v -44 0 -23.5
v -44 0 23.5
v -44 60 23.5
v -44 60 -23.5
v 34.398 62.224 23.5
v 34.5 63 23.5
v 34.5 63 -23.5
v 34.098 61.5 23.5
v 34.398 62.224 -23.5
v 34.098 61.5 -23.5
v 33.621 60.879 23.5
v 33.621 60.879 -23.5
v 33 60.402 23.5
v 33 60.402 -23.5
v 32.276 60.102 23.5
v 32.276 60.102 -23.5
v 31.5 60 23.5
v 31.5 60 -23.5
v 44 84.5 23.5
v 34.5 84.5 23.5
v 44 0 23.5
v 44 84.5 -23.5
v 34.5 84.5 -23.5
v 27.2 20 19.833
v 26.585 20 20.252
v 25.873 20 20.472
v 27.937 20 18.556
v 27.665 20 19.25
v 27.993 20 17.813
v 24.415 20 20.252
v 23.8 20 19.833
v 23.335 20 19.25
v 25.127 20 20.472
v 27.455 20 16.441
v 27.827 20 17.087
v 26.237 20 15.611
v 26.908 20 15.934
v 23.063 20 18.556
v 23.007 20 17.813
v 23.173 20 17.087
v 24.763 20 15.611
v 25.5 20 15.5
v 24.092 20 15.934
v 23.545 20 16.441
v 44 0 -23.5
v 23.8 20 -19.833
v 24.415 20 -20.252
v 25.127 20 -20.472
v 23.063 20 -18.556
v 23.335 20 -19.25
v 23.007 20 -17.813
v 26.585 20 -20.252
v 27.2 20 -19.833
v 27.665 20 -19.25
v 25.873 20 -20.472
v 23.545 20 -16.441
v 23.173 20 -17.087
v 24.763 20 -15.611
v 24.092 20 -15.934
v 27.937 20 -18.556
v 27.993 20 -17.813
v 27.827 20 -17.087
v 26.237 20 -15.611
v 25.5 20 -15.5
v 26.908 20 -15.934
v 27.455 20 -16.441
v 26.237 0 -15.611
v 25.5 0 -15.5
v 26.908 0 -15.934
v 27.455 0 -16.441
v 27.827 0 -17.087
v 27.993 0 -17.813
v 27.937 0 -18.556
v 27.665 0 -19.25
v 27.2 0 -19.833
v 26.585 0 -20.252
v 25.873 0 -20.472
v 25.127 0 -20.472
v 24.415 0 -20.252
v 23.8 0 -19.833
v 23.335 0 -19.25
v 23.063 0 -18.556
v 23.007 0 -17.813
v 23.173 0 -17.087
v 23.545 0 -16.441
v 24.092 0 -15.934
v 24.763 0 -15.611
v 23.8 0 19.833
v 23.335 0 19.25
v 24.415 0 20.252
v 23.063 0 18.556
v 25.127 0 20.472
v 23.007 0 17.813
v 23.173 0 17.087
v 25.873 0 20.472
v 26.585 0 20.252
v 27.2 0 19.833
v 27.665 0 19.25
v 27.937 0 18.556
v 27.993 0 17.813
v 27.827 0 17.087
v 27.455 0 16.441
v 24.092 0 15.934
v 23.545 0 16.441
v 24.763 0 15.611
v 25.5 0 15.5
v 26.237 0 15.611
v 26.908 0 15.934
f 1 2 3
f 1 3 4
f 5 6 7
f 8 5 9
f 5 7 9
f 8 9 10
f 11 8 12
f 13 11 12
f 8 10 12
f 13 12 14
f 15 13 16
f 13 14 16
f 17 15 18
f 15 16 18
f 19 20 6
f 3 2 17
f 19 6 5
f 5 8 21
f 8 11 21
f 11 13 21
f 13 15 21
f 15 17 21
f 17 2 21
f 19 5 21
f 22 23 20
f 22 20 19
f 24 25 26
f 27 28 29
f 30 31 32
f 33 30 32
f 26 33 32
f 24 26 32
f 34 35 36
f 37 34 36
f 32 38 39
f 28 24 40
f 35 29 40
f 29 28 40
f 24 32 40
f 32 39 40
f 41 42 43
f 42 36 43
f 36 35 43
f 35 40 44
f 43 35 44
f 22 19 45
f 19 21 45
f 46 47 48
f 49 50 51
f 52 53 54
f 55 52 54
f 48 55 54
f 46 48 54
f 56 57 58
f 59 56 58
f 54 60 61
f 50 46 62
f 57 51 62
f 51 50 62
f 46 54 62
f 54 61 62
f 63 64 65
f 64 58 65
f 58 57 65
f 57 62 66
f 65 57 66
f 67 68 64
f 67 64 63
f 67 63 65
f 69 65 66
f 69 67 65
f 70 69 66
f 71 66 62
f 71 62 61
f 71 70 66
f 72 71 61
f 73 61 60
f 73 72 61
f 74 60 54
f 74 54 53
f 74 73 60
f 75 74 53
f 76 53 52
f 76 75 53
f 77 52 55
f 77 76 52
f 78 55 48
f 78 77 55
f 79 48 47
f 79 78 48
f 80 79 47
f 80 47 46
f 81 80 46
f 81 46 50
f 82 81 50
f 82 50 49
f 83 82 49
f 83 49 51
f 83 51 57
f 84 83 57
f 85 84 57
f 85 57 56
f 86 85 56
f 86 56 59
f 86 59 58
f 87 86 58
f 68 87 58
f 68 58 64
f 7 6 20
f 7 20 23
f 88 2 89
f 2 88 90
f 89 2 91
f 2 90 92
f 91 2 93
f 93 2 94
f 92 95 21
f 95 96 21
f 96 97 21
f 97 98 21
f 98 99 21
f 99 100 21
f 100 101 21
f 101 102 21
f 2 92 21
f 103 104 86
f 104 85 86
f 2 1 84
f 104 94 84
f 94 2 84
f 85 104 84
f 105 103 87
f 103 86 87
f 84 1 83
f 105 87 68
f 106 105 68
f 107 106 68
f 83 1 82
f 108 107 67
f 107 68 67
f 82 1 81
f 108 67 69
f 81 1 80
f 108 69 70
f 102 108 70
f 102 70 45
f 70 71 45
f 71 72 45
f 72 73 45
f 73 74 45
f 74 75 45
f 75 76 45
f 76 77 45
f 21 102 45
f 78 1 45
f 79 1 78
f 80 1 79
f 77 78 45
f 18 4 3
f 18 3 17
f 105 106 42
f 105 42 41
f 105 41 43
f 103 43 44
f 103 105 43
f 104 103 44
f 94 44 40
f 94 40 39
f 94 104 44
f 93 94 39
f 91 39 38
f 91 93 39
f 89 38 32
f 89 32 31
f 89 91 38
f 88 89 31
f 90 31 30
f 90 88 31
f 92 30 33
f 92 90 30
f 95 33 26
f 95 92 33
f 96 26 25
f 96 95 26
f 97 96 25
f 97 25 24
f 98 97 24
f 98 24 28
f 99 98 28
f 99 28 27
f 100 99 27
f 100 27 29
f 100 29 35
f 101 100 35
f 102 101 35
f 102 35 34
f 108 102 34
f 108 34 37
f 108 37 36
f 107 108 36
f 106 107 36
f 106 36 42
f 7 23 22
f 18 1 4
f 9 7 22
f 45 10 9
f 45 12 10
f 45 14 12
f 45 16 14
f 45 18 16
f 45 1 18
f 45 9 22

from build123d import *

# Parameters (mm, degrees)
SKETCH1_W           = 88
SKETCH1_H           = 47
SKETCH1_R           = 2.5
BOSS_EXTRUDE1_DEPTH = 60
BOSS_EXTRUDE2_START = 20
SKETCH1_2_R         = 2.5
BOSS_EXTRUDE2_DEPTH = 40
SKETCH2_W           = 9.5
SKETCH2_H           = 47
BOSS_EXTRUDE3_DEPTH = 24.5
FILLET1_R           = 3


with BuildPart() as part:
    # Sketch1 → Boss-Extrude1 (new body)
    with BuildSketch(Plane(origin=(0, 0, 0), x_dir=(1, 0, 0), z_dir=(0, 1, 0))):
        Rectangle(SKETCH1_W, SKETCH1_H)
        with Locations((25.5, 18)):
            Circle(SKETCH1_R, mode=Mode.SUBTRACT)
        with Locations((25.5, -18)):
            Circle(SKETCH1_R, mode=Mode.SUBTRACT)
    extrude(amount=BOSS_EXTRUDE1_DEPTH)

    # Sketch1<2> → Boss-Extrude2 (add)
    with BuildSketch(Plane(origin=(0, 0, 0), x_dir=(1, 0, 0), z_dir=(0, 1, 0)).offset(BOSS_EXTRUDE2_START)):
        with Locations((25.5, 18)):
            Circle(SKETCH1_2_R)
        with Locations((25.5, -18)):
            Circle(SKETCH1_2_R)
    extrude(amount=BOSS_EXTRUDE2_DEPTH)

    # Sketch2 → Boss-Extrude3 (add)
    with BuildSketch(Plane(origin=(0, 60, 0), x_dir=(1, 0, 0), z_dir=(0, 1, 0))):
        with Locations((39.25, 0)):
            Rectangle(SKETCH2_W, SKETCH2_H)
    extrude(amount=BOSS_EXTRUDE3_DEPTH)

    # Fillet1
    fillet1_edges = [part.edges().sort_by_distance(p)[0] for p in [
        (34.5, 60, 0),
    ]]
    fillet(fillet1_edges, radius=FILLET1_R)


solid = part.part
